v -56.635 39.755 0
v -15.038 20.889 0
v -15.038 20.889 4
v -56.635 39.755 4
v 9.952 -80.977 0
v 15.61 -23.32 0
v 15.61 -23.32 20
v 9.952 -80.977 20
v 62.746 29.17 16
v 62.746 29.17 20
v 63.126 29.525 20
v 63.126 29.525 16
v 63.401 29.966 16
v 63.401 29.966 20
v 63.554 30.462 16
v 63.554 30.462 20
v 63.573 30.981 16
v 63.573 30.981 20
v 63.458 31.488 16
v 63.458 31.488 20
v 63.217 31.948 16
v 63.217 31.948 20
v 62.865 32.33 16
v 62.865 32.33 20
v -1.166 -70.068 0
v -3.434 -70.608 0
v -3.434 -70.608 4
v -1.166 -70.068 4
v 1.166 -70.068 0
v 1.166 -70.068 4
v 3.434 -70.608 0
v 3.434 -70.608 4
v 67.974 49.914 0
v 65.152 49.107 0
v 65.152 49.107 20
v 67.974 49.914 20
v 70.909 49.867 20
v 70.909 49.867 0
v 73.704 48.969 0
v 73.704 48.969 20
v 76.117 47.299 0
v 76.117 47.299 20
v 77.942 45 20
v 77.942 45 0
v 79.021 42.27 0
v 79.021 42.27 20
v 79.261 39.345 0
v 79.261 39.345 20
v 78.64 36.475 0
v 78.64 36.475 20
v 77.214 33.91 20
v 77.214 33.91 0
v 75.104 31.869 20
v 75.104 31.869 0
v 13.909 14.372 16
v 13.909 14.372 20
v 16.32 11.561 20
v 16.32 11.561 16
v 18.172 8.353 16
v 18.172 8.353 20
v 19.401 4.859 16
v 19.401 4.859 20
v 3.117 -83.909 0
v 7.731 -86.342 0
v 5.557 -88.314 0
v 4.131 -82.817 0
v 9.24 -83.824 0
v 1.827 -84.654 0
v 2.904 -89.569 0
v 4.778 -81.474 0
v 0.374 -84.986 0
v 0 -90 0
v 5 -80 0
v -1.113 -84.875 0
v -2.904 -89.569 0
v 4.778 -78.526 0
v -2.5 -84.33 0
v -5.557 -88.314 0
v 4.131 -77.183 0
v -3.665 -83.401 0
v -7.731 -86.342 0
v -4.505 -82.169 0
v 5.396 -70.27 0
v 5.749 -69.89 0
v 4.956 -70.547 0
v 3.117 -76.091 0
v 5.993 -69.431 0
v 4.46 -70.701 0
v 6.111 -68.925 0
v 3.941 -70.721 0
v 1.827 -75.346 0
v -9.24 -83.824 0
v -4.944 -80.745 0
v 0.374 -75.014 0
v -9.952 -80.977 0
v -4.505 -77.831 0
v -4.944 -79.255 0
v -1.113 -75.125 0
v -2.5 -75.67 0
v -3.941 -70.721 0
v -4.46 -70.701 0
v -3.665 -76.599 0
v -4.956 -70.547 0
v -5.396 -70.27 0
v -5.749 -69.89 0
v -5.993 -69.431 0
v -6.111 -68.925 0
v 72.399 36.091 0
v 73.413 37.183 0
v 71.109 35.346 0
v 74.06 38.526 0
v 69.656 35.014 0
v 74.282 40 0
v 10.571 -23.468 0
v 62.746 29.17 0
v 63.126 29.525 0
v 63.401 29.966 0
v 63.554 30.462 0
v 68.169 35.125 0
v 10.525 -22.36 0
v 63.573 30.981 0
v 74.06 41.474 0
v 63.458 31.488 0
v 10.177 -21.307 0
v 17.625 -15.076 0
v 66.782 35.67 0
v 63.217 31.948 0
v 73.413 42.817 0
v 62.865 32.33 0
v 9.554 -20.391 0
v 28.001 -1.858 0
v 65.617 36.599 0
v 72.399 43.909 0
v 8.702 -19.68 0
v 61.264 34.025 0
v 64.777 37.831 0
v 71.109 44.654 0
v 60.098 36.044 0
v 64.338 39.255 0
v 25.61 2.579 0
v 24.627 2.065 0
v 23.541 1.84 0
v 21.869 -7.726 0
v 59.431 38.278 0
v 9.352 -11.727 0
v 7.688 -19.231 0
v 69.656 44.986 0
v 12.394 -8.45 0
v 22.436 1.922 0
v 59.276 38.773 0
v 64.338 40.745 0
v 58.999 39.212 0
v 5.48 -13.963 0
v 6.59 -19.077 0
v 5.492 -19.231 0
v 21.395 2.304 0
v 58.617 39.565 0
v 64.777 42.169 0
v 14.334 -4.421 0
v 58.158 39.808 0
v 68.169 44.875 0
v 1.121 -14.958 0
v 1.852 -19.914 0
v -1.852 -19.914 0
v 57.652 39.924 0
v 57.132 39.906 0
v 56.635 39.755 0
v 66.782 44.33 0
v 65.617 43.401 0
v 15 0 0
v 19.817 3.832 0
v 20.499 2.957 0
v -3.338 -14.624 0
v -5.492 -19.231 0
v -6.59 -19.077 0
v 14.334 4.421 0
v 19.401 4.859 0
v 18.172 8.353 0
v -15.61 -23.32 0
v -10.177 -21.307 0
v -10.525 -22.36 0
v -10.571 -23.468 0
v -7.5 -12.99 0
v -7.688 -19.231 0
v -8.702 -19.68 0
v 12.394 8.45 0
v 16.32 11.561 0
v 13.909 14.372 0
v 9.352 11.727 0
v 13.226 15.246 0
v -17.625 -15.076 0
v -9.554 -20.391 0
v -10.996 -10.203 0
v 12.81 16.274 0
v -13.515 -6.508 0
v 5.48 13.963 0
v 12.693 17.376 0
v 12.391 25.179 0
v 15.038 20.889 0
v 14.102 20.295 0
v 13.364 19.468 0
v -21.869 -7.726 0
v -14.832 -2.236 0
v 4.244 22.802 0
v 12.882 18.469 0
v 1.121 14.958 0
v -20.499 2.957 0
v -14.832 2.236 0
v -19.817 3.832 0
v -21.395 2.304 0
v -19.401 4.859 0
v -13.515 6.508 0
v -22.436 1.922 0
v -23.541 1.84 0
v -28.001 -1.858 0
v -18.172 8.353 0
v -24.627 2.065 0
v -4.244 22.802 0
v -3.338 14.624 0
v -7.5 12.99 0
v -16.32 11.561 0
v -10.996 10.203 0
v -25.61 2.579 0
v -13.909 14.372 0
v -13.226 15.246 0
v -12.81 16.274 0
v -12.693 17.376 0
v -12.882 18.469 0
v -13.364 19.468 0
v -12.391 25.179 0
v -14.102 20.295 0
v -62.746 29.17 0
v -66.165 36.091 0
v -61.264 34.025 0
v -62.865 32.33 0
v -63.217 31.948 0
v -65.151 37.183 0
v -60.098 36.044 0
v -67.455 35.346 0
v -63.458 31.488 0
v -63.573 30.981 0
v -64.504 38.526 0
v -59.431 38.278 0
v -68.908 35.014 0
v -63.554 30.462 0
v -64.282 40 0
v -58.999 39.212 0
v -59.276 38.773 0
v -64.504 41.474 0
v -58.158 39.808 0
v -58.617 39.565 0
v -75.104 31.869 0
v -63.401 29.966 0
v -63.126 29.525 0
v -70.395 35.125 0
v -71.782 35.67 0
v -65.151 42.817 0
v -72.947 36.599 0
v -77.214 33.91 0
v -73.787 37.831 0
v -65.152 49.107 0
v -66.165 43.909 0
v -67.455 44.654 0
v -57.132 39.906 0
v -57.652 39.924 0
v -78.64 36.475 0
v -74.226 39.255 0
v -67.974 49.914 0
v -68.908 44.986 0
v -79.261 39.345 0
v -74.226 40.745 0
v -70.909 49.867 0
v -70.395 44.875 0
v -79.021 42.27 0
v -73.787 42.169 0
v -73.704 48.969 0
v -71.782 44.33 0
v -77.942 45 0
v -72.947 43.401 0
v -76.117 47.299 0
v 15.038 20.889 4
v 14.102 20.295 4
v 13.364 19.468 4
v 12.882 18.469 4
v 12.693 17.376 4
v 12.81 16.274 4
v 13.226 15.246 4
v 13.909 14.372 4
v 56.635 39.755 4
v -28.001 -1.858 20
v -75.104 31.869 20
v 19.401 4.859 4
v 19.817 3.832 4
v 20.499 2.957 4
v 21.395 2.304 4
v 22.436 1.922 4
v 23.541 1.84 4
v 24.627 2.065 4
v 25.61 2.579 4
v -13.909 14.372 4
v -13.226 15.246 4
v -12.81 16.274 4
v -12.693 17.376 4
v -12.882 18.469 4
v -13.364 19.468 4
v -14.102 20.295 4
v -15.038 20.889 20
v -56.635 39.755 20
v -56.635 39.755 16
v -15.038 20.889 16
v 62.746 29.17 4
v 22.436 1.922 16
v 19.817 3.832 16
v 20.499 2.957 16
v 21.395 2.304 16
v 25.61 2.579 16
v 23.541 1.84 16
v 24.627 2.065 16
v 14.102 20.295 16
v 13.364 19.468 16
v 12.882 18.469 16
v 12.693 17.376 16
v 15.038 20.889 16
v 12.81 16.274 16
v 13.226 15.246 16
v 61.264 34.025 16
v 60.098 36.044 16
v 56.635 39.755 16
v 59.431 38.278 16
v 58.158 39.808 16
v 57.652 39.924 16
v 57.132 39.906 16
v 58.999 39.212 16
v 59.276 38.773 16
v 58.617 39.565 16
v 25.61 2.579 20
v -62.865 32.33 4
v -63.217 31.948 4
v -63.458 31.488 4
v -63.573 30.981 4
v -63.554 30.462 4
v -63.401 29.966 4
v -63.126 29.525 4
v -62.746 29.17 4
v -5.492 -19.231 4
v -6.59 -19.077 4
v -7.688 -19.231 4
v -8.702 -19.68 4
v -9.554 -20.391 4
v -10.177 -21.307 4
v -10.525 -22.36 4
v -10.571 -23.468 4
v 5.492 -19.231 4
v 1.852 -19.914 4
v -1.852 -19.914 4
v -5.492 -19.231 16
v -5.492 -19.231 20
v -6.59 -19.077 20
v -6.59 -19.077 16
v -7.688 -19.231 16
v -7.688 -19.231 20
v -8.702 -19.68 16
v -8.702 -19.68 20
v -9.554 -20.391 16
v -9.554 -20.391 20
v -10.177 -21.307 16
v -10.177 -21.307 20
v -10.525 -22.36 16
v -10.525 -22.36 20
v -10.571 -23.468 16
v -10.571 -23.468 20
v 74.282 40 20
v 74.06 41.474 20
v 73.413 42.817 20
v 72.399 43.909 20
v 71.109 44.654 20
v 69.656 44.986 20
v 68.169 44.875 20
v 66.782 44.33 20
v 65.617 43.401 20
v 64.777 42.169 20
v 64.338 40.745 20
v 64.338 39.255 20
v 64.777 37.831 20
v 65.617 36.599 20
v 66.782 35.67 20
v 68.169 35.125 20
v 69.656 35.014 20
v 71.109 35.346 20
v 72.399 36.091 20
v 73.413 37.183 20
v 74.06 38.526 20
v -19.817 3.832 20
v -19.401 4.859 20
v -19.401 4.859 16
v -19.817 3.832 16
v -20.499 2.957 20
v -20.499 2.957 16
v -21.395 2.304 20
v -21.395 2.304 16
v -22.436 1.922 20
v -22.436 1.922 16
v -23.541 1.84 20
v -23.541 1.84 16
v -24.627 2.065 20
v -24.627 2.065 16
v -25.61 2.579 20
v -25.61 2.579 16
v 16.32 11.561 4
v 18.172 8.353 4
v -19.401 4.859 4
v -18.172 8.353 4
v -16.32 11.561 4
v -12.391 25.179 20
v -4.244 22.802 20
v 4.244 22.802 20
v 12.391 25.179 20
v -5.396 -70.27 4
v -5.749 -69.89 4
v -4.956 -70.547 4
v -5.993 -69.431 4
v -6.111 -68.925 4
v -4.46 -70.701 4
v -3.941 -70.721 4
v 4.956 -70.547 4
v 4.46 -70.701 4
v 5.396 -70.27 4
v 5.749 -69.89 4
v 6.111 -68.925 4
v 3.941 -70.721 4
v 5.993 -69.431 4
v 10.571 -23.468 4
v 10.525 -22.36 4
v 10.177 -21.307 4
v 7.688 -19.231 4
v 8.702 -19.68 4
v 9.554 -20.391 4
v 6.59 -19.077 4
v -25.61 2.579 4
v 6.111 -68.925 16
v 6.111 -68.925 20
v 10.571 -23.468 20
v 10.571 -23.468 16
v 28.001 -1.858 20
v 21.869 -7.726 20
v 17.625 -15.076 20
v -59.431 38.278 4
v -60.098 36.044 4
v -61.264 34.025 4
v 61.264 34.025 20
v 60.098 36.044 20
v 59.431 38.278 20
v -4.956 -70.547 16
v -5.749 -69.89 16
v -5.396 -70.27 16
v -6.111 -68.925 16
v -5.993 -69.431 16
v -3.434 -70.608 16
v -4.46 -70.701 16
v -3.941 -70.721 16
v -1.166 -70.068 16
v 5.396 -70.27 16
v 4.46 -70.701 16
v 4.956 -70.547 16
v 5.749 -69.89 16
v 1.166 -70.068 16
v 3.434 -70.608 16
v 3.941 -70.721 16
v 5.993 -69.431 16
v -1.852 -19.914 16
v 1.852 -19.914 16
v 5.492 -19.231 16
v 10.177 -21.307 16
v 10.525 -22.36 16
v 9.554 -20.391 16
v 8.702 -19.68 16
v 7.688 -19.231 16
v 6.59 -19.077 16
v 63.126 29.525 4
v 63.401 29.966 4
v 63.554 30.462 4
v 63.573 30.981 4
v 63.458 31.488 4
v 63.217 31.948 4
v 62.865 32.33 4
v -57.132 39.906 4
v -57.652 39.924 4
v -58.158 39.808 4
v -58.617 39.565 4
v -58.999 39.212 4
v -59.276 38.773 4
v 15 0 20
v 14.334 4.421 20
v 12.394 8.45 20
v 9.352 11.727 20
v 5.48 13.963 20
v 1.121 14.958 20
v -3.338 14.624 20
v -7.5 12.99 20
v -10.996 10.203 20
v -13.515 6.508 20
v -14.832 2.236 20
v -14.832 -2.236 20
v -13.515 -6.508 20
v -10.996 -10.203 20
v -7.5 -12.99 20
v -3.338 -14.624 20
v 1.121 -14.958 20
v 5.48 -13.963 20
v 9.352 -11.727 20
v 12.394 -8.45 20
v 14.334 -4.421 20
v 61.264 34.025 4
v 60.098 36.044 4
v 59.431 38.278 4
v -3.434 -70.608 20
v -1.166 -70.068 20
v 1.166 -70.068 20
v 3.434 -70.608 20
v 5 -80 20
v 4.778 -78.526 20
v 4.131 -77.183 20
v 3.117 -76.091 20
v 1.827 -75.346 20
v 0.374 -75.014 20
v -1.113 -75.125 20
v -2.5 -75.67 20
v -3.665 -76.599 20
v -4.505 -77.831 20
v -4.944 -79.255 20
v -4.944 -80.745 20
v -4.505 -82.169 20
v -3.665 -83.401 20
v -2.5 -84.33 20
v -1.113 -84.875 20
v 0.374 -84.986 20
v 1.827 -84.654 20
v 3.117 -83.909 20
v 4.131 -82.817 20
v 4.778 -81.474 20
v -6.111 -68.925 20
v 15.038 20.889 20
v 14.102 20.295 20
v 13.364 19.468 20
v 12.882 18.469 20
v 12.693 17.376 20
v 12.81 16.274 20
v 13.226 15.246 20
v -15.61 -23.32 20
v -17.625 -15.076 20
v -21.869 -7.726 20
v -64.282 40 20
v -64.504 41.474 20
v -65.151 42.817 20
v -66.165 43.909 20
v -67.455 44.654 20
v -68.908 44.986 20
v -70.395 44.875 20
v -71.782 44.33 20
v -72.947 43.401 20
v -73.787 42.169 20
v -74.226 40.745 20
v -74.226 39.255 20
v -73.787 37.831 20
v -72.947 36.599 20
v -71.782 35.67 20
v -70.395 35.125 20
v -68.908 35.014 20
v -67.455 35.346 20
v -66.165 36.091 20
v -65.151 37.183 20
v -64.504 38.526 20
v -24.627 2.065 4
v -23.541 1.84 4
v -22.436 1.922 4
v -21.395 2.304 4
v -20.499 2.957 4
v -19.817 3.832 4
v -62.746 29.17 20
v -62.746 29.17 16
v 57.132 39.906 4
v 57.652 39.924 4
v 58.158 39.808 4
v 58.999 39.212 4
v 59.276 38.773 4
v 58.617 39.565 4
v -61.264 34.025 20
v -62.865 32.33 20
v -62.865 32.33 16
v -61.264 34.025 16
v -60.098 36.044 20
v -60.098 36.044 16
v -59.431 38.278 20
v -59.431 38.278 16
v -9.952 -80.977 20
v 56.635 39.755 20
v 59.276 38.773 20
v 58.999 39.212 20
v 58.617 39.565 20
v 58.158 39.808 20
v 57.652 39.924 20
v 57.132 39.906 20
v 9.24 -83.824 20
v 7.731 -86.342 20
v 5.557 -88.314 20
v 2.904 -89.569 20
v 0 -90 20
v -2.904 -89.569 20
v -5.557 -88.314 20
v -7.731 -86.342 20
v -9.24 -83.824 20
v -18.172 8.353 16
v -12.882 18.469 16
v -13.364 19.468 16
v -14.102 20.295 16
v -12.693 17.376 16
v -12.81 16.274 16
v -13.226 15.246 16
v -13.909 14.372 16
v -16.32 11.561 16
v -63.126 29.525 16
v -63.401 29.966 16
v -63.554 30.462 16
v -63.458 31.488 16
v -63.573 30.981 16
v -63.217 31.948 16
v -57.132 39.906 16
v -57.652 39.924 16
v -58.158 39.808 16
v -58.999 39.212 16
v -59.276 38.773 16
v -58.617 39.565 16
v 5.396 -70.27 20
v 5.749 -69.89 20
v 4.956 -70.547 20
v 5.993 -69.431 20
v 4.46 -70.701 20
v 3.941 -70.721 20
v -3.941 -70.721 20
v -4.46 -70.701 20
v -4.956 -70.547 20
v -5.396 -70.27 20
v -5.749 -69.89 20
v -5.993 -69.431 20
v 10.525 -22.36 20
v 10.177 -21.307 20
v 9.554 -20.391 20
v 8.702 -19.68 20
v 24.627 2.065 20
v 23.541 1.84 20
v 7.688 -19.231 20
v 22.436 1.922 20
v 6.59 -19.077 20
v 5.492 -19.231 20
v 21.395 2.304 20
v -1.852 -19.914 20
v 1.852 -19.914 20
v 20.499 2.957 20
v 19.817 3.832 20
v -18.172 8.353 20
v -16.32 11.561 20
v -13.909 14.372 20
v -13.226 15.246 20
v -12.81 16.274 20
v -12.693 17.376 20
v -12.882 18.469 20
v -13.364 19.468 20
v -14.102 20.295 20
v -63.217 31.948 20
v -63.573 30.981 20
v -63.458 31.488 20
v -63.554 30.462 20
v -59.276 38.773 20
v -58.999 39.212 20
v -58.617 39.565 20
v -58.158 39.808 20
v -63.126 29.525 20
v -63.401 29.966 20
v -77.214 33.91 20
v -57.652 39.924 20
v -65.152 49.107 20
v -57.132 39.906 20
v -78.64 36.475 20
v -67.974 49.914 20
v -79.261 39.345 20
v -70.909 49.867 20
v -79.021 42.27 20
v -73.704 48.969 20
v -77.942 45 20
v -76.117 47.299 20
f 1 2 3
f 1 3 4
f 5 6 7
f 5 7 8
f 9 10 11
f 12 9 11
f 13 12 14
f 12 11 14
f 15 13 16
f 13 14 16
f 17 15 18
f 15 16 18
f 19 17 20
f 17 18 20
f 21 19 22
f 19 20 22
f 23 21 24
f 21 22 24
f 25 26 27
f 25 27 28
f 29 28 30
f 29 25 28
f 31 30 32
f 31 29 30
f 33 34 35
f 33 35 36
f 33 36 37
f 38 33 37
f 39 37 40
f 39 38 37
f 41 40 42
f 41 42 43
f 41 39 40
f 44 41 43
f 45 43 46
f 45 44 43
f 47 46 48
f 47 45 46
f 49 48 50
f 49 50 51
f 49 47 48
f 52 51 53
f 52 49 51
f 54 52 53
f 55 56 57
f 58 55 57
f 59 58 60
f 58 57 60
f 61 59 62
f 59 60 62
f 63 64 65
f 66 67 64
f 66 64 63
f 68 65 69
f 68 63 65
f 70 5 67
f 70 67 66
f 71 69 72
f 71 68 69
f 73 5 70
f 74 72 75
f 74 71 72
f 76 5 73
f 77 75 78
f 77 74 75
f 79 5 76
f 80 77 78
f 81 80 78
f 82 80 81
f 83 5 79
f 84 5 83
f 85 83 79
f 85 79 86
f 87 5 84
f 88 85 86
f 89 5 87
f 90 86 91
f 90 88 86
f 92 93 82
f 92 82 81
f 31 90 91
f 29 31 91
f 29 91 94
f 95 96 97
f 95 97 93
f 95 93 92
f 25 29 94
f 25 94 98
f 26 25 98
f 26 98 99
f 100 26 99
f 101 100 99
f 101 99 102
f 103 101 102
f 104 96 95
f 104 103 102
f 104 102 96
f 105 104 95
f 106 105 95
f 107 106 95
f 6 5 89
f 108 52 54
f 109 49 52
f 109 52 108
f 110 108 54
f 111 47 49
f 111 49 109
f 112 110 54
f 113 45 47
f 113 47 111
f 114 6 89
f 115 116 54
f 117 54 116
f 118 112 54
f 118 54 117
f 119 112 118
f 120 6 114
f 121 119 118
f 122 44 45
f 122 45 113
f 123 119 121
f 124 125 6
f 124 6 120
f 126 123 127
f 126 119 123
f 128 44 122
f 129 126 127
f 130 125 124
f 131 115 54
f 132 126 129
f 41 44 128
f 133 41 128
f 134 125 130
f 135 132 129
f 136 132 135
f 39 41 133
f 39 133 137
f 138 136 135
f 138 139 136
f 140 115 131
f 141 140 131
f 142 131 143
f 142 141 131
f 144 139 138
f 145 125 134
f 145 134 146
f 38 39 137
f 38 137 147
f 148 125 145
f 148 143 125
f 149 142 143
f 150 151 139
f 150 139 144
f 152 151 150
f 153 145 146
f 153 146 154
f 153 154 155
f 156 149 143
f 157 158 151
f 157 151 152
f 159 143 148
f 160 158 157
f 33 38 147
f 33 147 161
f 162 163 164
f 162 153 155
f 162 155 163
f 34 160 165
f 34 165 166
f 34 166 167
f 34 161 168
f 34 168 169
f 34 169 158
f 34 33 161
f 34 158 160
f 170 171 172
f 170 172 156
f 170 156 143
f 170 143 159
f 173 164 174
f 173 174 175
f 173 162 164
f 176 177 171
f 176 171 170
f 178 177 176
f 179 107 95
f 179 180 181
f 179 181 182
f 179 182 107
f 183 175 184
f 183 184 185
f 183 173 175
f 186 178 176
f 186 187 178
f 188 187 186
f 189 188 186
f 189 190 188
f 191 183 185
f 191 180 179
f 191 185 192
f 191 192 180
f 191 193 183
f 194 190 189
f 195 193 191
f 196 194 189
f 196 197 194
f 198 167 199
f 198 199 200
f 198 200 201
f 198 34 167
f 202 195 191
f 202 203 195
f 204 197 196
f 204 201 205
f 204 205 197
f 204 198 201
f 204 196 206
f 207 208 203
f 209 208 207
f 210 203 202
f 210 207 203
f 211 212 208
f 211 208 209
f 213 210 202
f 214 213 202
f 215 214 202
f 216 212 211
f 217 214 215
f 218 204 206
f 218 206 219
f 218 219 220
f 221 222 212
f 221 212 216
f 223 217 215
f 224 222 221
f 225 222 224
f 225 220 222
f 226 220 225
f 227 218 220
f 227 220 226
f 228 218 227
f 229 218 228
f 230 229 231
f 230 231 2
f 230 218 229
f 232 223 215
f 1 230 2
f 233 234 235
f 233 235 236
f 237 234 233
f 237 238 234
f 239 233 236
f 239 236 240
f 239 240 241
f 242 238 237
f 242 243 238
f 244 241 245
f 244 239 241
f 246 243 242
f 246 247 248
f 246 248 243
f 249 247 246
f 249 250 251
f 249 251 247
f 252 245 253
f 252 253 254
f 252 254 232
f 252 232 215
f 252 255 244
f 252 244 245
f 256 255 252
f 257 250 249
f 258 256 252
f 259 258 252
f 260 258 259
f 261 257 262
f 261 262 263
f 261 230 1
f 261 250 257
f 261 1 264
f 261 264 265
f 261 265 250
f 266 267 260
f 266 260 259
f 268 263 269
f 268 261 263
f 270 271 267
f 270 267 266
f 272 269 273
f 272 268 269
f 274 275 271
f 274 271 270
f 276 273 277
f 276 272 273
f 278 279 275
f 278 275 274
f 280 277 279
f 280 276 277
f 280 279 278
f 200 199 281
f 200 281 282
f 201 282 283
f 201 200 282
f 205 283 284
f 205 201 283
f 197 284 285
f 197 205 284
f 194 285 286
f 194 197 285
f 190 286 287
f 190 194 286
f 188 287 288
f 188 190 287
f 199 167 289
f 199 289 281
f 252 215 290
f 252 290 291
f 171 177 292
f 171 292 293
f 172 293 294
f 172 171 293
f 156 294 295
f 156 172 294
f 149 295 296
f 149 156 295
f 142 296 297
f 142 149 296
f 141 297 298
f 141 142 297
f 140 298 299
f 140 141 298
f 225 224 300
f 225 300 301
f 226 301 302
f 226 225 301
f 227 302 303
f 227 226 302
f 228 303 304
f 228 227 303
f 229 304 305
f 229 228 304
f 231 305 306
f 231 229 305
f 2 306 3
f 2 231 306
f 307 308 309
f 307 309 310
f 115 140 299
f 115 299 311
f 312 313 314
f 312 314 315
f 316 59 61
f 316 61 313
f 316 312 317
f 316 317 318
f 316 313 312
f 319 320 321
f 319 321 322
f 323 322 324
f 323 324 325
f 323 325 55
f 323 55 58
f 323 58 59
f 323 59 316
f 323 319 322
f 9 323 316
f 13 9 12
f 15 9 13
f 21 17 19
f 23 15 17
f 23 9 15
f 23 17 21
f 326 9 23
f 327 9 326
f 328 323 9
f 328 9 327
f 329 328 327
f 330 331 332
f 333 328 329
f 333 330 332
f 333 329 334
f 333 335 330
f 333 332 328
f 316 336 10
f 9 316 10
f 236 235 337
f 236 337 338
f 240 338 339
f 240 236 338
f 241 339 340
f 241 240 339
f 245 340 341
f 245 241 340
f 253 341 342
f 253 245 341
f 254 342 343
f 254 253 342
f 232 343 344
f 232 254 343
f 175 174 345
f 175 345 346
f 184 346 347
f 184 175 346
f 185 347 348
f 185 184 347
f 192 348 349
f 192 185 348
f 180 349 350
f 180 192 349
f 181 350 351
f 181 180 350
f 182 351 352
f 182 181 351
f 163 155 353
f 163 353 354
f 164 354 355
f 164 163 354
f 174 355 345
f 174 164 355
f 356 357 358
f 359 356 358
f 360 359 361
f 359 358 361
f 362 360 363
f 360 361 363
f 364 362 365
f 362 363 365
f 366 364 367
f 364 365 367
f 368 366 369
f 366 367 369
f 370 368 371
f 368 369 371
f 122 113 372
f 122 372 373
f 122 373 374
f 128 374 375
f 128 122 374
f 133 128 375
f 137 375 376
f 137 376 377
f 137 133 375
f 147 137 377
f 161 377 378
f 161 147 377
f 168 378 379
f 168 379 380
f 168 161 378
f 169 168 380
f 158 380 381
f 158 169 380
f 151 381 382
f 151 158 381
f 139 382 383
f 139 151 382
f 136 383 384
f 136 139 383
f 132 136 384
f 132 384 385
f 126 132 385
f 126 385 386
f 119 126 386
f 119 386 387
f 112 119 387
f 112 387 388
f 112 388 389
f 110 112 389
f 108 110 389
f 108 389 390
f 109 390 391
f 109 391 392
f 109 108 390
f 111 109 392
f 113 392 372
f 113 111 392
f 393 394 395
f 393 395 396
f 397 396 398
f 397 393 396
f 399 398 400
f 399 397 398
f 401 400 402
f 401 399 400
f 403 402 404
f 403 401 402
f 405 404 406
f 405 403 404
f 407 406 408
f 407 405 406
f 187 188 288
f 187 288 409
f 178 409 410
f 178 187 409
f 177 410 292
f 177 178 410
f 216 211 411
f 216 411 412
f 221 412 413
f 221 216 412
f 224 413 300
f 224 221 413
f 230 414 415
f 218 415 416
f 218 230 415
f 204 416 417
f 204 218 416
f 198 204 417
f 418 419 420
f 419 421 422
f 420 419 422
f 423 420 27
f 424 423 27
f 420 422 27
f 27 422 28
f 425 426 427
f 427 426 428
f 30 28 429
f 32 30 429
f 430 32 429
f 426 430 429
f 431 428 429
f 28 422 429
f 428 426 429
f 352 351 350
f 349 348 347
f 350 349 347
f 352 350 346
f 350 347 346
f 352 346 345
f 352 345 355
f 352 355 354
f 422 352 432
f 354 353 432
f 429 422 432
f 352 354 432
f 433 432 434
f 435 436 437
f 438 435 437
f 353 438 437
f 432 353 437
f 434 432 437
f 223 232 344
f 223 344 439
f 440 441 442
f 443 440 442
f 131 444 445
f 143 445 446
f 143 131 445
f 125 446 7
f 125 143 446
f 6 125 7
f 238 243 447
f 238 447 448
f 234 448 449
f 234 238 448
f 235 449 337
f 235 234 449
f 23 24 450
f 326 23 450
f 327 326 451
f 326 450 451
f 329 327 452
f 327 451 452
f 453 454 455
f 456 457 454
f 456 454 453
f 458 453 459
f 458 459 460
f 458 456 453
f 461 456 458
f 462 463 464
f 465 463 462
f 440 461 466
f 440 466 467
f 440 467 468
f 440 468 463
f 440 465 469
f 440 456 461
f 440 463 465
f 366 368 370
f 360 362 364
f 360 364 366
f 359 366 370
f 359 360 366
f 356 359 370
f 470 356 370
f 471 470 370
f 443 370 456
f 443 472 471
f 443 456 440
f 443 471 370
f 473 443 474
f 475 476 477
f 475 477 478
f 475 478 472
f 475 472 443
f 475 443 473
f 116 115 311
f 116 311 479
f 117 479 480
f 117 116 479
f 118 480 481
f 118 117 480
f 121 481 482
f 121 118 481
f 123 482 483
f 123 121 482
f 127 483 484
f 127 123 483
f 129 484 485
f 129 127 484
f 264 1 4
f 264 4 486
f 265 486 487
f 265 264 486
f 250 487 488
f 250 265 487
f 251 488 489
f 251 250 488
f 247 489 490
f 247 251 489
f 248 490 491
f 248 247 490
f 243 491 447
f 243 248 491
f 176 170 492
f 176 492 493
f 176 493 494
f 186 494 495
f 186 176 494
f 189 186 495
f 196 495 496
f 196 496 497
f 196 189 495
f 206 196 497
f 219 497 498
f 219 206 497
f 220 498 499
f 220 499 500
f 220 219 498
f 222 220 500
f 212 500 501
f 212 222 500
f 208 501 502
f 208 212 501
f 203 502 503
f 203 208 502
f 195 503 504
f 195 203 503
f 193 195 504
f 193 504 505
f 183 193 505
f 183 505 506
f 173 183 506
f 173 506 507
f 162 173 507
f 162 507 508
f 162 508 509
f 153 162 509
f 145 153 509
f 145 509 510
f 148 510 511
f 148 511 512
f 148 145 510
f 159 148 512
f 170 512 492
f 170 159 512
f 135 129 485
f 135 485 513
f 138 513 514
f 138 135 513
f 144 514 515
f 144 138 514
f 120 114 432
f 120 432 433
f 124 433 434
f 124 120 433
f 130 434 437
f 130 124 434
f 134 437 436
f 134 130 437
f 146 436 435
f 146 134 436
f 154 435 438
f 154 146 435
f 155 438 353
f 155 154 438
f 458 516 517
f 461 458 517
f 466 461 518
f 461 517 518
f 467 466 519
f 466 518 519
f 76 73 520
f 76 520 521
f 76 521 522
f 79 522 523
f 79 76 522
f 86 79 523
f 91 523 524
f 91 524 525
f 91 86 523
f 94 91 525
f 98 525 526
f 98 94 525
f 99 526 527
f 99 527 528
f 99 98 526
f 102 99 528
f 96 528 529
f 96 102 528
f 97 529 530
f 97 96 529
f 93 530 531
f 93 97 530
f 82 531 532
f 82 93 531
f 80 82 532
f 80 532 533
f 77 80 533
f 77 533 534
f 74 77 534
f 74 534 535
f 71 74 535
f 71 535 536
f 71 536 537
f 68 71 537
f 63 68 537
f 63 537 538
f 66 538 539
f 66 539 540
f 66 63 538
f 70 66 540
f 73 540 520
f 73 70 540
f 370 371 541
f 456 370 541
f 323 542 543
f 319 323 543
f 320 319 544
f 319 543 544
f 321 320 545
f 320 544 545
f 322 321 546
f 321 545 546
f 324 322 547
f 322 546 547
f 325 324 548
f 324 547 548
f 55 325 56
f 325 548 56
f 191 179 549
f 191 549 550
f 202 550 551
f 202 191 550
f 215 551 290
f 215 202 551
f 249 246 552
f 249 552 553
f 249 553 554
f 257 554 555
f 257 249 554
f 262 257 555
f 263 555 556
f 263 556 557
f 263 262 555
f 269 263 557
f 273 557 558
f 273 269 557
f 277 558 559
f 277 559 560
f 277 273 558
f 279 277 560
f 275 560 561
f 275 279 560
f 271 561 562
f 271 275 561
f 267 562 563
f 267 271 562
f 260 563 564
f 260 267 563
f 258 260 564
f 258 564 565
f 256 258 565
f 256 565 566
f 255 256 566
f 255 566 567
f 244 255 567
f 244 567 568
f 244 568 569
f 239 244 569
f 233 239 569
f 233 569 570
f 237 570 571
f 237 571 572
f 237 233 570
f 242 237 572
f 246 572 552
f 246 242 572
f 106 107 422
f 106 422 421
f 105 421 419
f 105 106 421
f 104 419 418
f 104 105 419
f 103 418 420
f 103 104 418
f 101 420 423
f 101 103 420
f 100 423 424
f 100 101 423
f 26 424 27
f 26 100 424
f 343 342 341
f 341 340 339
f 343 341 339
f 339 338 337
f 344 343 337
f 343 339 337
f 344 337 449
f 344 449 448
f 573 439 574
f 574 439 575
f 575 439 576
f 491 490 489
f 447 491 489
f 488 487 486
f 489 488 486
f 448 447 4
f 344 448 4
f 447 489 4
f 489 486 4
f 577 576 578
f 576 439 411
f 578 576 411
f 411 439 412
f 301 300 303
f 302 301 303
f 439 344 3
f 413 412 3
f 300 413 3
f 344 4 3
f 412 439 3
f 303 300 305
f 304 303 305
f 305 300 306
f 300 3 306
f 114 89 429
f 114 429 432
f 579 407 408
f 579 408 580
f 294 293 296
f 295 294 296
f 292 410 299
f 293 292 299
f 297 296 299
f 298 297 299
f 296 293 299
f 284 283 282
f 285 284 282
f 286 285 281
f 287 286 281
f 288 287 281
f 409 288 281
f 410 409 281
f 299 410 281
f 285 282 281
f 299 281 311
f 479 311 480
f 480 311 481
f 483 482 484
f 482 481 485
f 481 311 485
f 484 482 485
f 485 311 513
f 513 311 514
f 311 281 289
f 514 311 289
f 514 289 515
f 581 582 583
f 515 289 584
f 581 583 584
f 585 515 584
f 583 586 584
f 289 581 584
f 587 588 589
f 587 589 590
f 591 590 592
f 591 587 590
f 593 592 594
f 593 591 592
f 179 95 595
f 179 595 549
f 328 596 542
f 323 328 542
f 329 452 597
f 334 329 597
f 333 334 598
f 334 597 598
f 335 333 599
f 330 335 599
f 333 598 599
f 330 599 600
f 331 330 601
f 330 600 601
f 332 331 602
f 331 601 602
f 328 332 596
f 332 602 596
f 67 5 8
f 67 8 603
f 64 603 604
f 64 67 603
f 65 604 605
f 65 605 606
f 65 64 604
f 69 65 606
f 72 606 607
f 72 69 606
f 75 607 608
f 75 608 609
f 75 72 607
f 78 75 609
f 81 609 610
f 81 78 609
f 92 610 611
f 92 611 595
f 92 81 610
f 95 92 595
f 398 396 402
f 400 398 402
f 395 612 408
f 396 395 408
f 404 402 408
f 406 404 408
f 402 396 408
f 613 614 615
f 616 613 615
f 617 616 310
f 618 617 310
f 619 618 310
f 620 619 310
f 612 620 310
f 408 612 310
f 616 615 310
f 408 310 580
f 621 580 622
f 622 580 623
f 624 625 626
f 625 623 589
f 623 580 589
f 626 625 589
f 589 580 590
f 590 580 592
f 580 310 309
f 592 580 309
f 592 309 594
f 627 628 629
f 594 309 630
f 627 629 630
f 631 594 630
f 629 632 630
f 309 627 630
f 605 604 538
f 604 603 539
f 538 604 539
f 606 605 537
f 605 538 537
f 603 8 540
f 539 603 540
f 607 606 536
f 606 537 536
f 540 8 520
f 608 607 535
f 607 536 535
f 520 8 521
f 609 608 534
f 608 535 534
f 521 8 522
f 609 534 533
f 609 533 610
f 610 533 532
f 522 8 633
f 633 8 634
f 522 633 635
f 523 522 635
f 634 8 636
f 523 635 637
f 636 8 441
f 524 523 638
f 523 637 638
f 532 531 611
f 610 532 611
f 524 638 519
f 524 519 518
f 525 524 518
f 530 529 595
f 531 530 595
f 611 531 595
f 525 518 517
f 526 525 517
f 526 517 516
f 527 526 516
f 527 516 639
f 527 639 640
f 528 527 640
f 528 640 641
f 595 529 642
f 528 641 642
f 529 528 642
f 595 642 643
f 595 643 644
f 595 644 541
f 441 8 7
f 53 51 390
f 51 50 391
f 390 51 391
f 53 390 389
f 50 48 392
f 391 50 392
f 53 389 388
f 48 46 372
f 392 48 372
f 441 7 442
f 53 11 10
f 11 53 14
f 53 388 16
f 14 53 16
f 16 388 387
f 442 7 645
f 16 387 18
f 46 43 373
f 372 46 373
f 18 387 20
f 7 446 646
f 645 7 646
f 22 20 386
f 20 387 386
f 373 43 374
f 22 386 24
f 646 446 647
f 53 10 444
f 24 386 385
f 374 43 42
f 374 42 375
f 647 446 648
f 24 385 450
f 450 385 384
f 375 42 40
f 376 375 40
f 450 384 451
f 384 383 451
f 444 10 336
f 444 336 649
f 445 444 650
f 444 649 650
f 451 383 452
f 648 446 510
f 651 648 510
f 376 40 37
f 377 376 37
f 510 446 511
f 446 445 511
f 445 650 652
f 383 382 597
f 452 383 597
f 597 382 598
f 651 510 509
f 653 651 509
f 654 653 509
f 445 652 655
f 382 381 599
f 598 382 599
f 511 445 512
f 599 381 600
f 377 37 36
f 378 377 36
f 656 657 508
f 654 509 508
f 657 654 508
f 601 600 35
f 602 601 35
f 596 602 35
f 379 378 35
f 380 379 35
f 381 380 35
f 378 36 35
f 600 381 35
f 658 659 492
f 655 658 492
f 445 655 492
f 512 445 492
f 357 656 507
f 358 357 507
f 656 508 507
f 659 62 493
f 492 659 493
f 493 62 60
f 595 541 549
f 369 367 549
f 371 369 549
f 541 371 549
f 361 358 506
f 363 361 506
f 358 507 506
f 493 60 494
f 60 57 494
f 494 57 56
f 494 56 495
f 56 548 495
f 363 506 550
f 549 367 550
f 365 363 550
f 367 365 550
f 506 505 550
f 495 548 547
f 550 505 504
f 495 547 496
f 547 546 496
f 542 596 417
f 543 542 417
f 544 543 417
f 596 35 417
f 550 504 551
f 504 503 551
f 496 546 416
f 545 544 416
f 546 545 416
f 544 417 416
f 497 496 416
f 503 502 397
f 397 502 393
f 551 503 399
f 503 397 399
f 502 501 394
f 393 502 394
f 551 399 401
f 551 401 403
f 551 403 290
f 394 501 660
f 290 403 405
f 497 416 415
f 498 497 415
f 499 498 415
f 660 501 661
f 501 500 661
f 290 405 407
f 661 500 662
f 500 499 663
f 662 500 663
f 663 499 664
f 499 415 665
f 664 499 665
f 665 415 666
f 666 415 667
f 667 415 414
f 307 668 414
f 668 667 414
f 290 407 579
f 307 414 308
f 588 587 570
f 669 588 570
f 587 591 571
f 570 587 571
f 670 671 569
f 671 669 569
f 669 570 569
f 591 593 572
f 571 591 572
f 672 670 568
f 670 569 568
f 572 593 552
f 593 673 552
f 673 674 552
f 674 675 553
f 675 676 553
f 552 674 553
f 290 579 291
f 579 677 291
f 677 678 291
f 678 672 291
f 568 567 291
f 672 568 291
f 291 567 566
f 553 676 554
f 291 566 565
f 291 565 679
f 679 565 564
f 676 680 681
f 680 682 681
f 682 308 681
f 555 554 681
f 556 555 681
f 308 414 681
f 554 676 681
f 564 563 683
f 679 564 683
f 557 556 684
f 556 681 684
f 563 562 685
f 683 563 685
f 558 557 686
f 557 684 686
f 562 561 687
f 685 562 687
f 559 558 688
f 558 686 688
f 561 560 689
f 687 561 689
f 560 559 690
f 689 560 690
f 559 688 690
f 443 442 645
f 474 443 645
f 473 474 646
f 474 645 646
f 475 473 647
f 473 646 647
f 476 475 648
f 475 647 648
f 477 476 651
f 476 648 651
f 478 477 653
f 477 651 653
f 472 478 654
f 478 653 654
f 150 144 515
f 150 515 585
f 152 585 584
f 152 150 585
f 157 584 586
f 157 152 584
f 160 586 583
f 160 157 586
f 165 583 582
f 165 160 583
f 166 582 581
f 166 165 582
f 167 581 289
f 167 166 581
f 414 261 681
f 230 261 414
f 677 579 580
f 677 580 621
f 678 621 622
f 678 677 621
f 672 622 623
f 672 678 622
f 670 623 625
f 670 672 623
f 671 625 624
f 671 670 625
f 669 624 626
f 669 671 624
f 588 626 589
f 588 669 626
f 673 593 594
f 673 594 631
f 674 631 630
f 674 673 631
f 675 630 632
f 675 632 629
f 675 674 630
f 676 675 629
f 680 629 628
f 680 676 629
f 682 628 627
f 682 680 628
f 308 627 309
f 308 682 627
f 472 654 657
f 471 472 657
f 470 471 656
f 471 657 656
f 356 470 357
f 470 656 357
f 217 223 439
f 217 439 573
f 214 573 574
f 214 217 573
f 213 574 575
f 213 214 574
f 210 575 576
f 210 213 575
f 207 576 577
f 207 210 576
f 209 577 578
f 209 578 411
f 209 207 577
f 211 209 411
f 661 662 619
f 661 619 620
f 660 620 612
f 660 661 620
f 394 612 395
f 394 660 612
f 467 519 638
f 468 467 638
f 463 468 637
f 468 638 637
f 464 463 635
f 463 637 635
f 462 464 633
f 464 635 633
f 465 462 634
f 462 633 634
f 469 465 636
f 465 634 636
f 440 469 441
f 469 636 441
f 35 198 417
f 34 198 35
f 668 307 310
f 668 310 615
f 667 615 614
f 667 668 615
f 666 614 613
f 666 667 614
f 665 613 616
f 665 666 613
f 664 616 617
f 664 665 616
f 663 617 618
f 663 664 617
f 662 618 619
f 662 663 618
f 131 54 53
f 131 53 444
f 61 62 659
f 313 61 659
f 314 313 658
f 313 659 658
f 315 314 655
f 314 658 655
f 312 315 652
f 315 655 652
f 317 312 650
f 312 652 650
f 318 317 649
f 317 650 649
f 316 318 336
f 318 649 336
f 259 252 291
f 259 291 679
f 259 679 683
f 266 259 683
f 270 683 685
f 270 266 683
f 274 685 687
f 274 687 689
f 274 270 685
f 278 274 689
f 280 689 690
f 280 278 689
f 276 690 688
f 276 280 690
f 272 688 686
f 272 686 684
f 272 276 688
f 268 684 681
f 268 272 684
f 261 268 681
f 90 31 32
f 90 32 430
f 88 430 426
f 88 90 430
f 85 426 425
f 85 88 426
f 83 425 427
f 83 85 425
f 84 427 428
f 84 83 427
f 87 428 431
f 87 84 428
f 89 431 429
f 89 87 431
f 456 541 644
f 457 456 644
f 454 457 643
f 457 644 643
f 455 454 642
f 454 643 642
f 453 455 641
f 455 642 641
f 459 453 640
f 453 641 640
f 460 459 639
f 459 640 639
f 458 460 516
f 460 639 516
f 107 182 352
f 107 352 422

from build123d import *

# Parameters (mm, degrees)
SKETCH1_R           = 15
SKETCH1_R_2         = 5
BOSS_EXTRUDE2_DEPTH = 20
SKETCH7_OUTSIDE_W   = 203.058
SKETCH7_OUTSIDE_H   = 184.494
CUT_EXTRUDE4_DEPTH  = 4
CUT_EXTRUDE5_DEPTH  = 4


with BuildPart() as part:
    # Sketch1 → Boss-Extrude2 (new body)
    with BuildSketch(Plane.XY):
        with BuildLine():
            Line((-9.952202212, -80.976560871), (-15.609727063, -23.320317388))
            ThreePointArc((-15.609727063, -23.320317388), (-19.485571585, -11.25), (-28.000850814, -1.858261489))
            Line((-28.000850814, -1.858261489), (-75.103859931, 31.869420496))
            ThreePointArc((-75.103859931, 31.869420496), (-77.942286341, 45), (-65.151657719, 49.107140374))
            Line((-65.151657719, 49.107140374), (-12.391123751, 25.178578877))
            ThreePointArc((-12.391123751, 25.178578877), (0, 22.5), (12.391123751, 25.178578877))
            Line((12.391123751, 25.178578877), (65.151657719, 49.107140374))
            ThreePointArc((65.151657719, 49.107140374), (77.942286341, 45), (75.103859931, 31.869420496))
            Line((75.103859931, 31.869420496), (28.000850814, -1.858261489))
            ThreePointArc((28.000850814, -1.858261489), (19.485571585, -11.25), (15.609727063, -23.320317388))
            Line((15.609727063, -23.320317388), (9.952202212, -80.976560871))
            ThreePointArc((9.952202212, -80.976560871), (0, -90), (-9.952202212, -80.976560871))
        make_face()
        Circle(SKETCH1_R, mode=Mode.SUBTRACT)
        with Locations((0, -80)):
            Circle(SKETCH1_R_2, mode=Mode.SUBTRACT)
        with Locations((-69.282032303, 40)):
            Circle(SKETCH1_R_2, mode=Mode.SUBTRACT)
        with Locations((69.282032303, 40)):
            Circle(SKETCH1_R_2, mode=Mode.SUBTRACT)
    extrude(amount=BOSS_EXTRUDE2_DEPTH)

    # Sketch7 outside → Cut-Extrude4 (cut)
    with BuildSketch(Plane.XY.offset(20)):
        with Locations((0, -20)):
            Rectangle(SKETCH7_OUTSIDE_W, SKETCH7_OUTSIDE_H)
        with BuildLine():
            Line((-15.609727063, -23.320317388), (-9.952202212, -80.976560871))
            ThreePointArc((-9.952202212, -80.976560871), (0, -90), (9.952202212, -80.976560871))
            Line((9.952202212, -80.976560871), (15.609727063, -23.320317388))
            ThreePointArc((15.609727063, -23.320317388), (19.485571585, -11.25), (28.000850814, -1.858261489))
            Line((28.000850814, -1.858261489), (75.103859931, 31.869420496))
            ThreePointArc((75.103859931, 31.869420496), (77.942286341, 45), (65.151657719, 49.107140374))
            Line((65.151657719, 49.107140374), (12.391123751, 25.178578877))
            ThreePointArc((12.391123751, 25.178578877), (0, 22.5), (-12.391123751, 25.178578877))
            Line((-12.391123751, 25.178578877), (-65.151657719, 49.107140374))
            ThreePointArc((-65.151657719, 49.107140374), (-77.942286341, 45), (-75.103859931, 31.869420496))
            Line((-75.103859931, 31.869420496), (-28.000850814, -1.858261489))
            ThreePointArc((-28.000850814, -1.858261489), (-19.485571585, -11.25), (-15.609727063, -23.320317388))
        make_face(mode=Mode.SUBTRACT)
        with BuildLine():
            Line((-25.609534097, 2.579081047), (-62.746066413, 29.170357813))
            ThreePointArc((-62.746066413, 29.170357813), (-63.580283737, 30.721196932), (-62.865089457, 32.330394762))
            ThreePointArc((-62.865089457, 32.330394762), (-60.621778265, 35), (-59.431487906, 38.2775671))
            ThreePointArc((-59.431487906, 38.2775671), (-58.395478846, 39.70154243), (-56.63530411, 39.754508595))
            Line((-56.63530411, 39.754508595), (-15.038316754, 20.888966584))
            ThreePointArc((-15.038316754, 20.888966584), (-12.749228932, 17.929225173), (-13.908722156, 14.371758695))
            ThreePointArc((-13.908722156, 14.371758695), (-17.320508076, 10), (-19.400669205, 4.859427374))
            ThreePointArc((-19.400669205, 4.859427374), (-21.901778936, 2.076543547), (-25.609534097, 2.579081047))
        make_face()
        with BuildLine():
            Line((25.609534097, 2.579081047), (62.746066413, 29.170357813))
            ThreePointArc((62.746066413, 29.170357813), (63.580283737, 30.721196932), (62.865089457, 32.330394762))
            ThreePointArc((62.865089457, 32.330394762), (60.621778265, 35), (59.431487906, 38.2775671))
            ThreePointArc((59.431487906, 38.2775671), (58.395478846, 39.70154243), (56.63530411, 39.754508595))
            Line((56.63530411, 39.754508595), (15.038316754, 20.888966584))
            ThreePointArc((15.038316754, 20.888966584), (12.749228932, 17.929225173), (13.908722156, 14.371758695))
            ThreePointArc((13.908722156, 14.371758695), (17.320508076, 10), (19.400669205, 4.859427374))
            ThreePointArc((19.400669205, 4.859427374), (21.901778936, 2.076543547), (25.609534097, 2.579081047))
        make_face()
        with BuildLine():
            Line((-10.571217344, -23.468047631), (-6.110762303, -68.924866408))
            ThreePointArc((-6.110762303, -68.924866408), (-5.184804891, -70.422739362), (-3.43360155, -70.607961862))
            ThreePointArc((-3.43360155, -70.607961862), (0, -70), (3.43360155, -70.607961862))
            ThreePointArc((3.43360155, -70.607961862), (5.184804891, -70.422739362), (6.110762303, -68.924866408))
            Line((6.110762303, -68.924866408), (10.571217344, -23.468047631))
            ThreePointArc((10.571217344, -23.468047631), (9.152550004, -20.00576872), (5.491947049, -19.231186069))
            ThreePointArc((5.491947049, -19.231186069), (0, -20), (-5.491947049, -19.231186069))
            ThreePointArc((-5.491947049, -19.231186069), (-9.152550004, -20.00576872), (-10.571217344, -23.468047631))
        make_face()
    extrude(amount=-CUT_EXTRUDE4_DEPTH, mode=Mode.SUBTRACT)

    # Sketch3 → Cut-Extrude5 (cut)
    with BuildSketch(Plane(origin=(0, 0, 0), x_dir=(-1, 0, 0), z_dir=(0, 0, -1))):
        with BuildLine():
            Line((10.571217344, -23.468047631), (6.110762303, -68.924866408))
            ThreePointArc((6.110762303, -68.924866408), (5.184804891, -70.422739362), (3.43360155, -70.607961862))
            ThreePointArc((3.43360155, -70.607961862), (0, -70), (-3.43360155, -70.607961862))
            ThreePointArc((-3.43360155, -70.607961862), (-5.184804891, -70.422739362), (-6.110762303, -68.924866408))
            Line((-6.110762303, -68.924866408), (-10.571217344, -23.468047631))
            ThreePointArc((-10.571217344, -23.468047631), (-9.152550004, -20.00576872), (-5.491947049, -19.231186069))
            ThreePointArc((-5.491947049, -19.231186069), (0, -20), (5.491947049, -19.231186069))
            ThreePointArc((5.491947049, -19.231186069), (9.152550004, -20.00576872), (10.571217344, -23.468047631))
        make_face()
        with BuildLine():
            Line((-25.609534097, 2.579081047), (-62.746066413, 29.170357813))
            ThreePointArc((-62.746066413, 29.170357813), (-63.580283737, 30.721196932), (-62.865089457, 32.330394762))
            ThreePointArc((-62.865089457, 32.330394762), (-60.621778265, 35), (-59.431487906, 38.2775671))
            ThreePointArc((-59.431487906, 38.2775671), (-58.395478846, 39.70154243), (-56.63530411, 39.754508595))
            Line((-56.63530411, 39.754508595), (-15.038316754, 20.888966584))
            ThreePointArc((-15.038316754, 20.888966584), (-12.749228932, 17.929225173), (-13.908722156, 14.371758695))
            ThreePointArc((-13.908722156, 14.371758695), (-17.320508076, 10), (-19.400669205, 4.859427374))
            ThreePointArc((-19.400669205, 4.859427374), (-21.901778936, 2.076543547), (-25.609534097, 2.579081047))
        make_face()
        with BuildLine():
            Line((15.038316754, 20.888966584), (56.63530411, 39.754508595))
            ThreePointArc((56.63530411, 39.754508595), (58.395478846, 39.70154243), (59.431487906, 38.2775671))
            ThreePointArc((59.431487906, 38.2775671), (60.621778265, 35), (62.865089457, 32.330394762))
            ThreePointArc((62.865089457, 32.330394762), (63.580283737, 30.721196932), (62.746066413, 29.170357813))
            Line((62.746066413, 29.170357813), (25.609534097, 2.579081047))
            ThreePointArc((25.609534097, 2.579081047), (21.901778936, 2.076543547), (19.400669205, 4.859427374))
            ThreePointArc((19.400669205, 4.859427374), (17.320508076, 10), (13.908722156, 14.371758695))
            ThreePointArc((13.908722156, 14.371758695), (12.749228932, 17.929225173), (15.038316754, 20.888966584))
        make_face()
    extrude(amount=-CUT_EXTRUDE5_DEPTH, mode=Mode.SUBTRACT)


solid = part.part
